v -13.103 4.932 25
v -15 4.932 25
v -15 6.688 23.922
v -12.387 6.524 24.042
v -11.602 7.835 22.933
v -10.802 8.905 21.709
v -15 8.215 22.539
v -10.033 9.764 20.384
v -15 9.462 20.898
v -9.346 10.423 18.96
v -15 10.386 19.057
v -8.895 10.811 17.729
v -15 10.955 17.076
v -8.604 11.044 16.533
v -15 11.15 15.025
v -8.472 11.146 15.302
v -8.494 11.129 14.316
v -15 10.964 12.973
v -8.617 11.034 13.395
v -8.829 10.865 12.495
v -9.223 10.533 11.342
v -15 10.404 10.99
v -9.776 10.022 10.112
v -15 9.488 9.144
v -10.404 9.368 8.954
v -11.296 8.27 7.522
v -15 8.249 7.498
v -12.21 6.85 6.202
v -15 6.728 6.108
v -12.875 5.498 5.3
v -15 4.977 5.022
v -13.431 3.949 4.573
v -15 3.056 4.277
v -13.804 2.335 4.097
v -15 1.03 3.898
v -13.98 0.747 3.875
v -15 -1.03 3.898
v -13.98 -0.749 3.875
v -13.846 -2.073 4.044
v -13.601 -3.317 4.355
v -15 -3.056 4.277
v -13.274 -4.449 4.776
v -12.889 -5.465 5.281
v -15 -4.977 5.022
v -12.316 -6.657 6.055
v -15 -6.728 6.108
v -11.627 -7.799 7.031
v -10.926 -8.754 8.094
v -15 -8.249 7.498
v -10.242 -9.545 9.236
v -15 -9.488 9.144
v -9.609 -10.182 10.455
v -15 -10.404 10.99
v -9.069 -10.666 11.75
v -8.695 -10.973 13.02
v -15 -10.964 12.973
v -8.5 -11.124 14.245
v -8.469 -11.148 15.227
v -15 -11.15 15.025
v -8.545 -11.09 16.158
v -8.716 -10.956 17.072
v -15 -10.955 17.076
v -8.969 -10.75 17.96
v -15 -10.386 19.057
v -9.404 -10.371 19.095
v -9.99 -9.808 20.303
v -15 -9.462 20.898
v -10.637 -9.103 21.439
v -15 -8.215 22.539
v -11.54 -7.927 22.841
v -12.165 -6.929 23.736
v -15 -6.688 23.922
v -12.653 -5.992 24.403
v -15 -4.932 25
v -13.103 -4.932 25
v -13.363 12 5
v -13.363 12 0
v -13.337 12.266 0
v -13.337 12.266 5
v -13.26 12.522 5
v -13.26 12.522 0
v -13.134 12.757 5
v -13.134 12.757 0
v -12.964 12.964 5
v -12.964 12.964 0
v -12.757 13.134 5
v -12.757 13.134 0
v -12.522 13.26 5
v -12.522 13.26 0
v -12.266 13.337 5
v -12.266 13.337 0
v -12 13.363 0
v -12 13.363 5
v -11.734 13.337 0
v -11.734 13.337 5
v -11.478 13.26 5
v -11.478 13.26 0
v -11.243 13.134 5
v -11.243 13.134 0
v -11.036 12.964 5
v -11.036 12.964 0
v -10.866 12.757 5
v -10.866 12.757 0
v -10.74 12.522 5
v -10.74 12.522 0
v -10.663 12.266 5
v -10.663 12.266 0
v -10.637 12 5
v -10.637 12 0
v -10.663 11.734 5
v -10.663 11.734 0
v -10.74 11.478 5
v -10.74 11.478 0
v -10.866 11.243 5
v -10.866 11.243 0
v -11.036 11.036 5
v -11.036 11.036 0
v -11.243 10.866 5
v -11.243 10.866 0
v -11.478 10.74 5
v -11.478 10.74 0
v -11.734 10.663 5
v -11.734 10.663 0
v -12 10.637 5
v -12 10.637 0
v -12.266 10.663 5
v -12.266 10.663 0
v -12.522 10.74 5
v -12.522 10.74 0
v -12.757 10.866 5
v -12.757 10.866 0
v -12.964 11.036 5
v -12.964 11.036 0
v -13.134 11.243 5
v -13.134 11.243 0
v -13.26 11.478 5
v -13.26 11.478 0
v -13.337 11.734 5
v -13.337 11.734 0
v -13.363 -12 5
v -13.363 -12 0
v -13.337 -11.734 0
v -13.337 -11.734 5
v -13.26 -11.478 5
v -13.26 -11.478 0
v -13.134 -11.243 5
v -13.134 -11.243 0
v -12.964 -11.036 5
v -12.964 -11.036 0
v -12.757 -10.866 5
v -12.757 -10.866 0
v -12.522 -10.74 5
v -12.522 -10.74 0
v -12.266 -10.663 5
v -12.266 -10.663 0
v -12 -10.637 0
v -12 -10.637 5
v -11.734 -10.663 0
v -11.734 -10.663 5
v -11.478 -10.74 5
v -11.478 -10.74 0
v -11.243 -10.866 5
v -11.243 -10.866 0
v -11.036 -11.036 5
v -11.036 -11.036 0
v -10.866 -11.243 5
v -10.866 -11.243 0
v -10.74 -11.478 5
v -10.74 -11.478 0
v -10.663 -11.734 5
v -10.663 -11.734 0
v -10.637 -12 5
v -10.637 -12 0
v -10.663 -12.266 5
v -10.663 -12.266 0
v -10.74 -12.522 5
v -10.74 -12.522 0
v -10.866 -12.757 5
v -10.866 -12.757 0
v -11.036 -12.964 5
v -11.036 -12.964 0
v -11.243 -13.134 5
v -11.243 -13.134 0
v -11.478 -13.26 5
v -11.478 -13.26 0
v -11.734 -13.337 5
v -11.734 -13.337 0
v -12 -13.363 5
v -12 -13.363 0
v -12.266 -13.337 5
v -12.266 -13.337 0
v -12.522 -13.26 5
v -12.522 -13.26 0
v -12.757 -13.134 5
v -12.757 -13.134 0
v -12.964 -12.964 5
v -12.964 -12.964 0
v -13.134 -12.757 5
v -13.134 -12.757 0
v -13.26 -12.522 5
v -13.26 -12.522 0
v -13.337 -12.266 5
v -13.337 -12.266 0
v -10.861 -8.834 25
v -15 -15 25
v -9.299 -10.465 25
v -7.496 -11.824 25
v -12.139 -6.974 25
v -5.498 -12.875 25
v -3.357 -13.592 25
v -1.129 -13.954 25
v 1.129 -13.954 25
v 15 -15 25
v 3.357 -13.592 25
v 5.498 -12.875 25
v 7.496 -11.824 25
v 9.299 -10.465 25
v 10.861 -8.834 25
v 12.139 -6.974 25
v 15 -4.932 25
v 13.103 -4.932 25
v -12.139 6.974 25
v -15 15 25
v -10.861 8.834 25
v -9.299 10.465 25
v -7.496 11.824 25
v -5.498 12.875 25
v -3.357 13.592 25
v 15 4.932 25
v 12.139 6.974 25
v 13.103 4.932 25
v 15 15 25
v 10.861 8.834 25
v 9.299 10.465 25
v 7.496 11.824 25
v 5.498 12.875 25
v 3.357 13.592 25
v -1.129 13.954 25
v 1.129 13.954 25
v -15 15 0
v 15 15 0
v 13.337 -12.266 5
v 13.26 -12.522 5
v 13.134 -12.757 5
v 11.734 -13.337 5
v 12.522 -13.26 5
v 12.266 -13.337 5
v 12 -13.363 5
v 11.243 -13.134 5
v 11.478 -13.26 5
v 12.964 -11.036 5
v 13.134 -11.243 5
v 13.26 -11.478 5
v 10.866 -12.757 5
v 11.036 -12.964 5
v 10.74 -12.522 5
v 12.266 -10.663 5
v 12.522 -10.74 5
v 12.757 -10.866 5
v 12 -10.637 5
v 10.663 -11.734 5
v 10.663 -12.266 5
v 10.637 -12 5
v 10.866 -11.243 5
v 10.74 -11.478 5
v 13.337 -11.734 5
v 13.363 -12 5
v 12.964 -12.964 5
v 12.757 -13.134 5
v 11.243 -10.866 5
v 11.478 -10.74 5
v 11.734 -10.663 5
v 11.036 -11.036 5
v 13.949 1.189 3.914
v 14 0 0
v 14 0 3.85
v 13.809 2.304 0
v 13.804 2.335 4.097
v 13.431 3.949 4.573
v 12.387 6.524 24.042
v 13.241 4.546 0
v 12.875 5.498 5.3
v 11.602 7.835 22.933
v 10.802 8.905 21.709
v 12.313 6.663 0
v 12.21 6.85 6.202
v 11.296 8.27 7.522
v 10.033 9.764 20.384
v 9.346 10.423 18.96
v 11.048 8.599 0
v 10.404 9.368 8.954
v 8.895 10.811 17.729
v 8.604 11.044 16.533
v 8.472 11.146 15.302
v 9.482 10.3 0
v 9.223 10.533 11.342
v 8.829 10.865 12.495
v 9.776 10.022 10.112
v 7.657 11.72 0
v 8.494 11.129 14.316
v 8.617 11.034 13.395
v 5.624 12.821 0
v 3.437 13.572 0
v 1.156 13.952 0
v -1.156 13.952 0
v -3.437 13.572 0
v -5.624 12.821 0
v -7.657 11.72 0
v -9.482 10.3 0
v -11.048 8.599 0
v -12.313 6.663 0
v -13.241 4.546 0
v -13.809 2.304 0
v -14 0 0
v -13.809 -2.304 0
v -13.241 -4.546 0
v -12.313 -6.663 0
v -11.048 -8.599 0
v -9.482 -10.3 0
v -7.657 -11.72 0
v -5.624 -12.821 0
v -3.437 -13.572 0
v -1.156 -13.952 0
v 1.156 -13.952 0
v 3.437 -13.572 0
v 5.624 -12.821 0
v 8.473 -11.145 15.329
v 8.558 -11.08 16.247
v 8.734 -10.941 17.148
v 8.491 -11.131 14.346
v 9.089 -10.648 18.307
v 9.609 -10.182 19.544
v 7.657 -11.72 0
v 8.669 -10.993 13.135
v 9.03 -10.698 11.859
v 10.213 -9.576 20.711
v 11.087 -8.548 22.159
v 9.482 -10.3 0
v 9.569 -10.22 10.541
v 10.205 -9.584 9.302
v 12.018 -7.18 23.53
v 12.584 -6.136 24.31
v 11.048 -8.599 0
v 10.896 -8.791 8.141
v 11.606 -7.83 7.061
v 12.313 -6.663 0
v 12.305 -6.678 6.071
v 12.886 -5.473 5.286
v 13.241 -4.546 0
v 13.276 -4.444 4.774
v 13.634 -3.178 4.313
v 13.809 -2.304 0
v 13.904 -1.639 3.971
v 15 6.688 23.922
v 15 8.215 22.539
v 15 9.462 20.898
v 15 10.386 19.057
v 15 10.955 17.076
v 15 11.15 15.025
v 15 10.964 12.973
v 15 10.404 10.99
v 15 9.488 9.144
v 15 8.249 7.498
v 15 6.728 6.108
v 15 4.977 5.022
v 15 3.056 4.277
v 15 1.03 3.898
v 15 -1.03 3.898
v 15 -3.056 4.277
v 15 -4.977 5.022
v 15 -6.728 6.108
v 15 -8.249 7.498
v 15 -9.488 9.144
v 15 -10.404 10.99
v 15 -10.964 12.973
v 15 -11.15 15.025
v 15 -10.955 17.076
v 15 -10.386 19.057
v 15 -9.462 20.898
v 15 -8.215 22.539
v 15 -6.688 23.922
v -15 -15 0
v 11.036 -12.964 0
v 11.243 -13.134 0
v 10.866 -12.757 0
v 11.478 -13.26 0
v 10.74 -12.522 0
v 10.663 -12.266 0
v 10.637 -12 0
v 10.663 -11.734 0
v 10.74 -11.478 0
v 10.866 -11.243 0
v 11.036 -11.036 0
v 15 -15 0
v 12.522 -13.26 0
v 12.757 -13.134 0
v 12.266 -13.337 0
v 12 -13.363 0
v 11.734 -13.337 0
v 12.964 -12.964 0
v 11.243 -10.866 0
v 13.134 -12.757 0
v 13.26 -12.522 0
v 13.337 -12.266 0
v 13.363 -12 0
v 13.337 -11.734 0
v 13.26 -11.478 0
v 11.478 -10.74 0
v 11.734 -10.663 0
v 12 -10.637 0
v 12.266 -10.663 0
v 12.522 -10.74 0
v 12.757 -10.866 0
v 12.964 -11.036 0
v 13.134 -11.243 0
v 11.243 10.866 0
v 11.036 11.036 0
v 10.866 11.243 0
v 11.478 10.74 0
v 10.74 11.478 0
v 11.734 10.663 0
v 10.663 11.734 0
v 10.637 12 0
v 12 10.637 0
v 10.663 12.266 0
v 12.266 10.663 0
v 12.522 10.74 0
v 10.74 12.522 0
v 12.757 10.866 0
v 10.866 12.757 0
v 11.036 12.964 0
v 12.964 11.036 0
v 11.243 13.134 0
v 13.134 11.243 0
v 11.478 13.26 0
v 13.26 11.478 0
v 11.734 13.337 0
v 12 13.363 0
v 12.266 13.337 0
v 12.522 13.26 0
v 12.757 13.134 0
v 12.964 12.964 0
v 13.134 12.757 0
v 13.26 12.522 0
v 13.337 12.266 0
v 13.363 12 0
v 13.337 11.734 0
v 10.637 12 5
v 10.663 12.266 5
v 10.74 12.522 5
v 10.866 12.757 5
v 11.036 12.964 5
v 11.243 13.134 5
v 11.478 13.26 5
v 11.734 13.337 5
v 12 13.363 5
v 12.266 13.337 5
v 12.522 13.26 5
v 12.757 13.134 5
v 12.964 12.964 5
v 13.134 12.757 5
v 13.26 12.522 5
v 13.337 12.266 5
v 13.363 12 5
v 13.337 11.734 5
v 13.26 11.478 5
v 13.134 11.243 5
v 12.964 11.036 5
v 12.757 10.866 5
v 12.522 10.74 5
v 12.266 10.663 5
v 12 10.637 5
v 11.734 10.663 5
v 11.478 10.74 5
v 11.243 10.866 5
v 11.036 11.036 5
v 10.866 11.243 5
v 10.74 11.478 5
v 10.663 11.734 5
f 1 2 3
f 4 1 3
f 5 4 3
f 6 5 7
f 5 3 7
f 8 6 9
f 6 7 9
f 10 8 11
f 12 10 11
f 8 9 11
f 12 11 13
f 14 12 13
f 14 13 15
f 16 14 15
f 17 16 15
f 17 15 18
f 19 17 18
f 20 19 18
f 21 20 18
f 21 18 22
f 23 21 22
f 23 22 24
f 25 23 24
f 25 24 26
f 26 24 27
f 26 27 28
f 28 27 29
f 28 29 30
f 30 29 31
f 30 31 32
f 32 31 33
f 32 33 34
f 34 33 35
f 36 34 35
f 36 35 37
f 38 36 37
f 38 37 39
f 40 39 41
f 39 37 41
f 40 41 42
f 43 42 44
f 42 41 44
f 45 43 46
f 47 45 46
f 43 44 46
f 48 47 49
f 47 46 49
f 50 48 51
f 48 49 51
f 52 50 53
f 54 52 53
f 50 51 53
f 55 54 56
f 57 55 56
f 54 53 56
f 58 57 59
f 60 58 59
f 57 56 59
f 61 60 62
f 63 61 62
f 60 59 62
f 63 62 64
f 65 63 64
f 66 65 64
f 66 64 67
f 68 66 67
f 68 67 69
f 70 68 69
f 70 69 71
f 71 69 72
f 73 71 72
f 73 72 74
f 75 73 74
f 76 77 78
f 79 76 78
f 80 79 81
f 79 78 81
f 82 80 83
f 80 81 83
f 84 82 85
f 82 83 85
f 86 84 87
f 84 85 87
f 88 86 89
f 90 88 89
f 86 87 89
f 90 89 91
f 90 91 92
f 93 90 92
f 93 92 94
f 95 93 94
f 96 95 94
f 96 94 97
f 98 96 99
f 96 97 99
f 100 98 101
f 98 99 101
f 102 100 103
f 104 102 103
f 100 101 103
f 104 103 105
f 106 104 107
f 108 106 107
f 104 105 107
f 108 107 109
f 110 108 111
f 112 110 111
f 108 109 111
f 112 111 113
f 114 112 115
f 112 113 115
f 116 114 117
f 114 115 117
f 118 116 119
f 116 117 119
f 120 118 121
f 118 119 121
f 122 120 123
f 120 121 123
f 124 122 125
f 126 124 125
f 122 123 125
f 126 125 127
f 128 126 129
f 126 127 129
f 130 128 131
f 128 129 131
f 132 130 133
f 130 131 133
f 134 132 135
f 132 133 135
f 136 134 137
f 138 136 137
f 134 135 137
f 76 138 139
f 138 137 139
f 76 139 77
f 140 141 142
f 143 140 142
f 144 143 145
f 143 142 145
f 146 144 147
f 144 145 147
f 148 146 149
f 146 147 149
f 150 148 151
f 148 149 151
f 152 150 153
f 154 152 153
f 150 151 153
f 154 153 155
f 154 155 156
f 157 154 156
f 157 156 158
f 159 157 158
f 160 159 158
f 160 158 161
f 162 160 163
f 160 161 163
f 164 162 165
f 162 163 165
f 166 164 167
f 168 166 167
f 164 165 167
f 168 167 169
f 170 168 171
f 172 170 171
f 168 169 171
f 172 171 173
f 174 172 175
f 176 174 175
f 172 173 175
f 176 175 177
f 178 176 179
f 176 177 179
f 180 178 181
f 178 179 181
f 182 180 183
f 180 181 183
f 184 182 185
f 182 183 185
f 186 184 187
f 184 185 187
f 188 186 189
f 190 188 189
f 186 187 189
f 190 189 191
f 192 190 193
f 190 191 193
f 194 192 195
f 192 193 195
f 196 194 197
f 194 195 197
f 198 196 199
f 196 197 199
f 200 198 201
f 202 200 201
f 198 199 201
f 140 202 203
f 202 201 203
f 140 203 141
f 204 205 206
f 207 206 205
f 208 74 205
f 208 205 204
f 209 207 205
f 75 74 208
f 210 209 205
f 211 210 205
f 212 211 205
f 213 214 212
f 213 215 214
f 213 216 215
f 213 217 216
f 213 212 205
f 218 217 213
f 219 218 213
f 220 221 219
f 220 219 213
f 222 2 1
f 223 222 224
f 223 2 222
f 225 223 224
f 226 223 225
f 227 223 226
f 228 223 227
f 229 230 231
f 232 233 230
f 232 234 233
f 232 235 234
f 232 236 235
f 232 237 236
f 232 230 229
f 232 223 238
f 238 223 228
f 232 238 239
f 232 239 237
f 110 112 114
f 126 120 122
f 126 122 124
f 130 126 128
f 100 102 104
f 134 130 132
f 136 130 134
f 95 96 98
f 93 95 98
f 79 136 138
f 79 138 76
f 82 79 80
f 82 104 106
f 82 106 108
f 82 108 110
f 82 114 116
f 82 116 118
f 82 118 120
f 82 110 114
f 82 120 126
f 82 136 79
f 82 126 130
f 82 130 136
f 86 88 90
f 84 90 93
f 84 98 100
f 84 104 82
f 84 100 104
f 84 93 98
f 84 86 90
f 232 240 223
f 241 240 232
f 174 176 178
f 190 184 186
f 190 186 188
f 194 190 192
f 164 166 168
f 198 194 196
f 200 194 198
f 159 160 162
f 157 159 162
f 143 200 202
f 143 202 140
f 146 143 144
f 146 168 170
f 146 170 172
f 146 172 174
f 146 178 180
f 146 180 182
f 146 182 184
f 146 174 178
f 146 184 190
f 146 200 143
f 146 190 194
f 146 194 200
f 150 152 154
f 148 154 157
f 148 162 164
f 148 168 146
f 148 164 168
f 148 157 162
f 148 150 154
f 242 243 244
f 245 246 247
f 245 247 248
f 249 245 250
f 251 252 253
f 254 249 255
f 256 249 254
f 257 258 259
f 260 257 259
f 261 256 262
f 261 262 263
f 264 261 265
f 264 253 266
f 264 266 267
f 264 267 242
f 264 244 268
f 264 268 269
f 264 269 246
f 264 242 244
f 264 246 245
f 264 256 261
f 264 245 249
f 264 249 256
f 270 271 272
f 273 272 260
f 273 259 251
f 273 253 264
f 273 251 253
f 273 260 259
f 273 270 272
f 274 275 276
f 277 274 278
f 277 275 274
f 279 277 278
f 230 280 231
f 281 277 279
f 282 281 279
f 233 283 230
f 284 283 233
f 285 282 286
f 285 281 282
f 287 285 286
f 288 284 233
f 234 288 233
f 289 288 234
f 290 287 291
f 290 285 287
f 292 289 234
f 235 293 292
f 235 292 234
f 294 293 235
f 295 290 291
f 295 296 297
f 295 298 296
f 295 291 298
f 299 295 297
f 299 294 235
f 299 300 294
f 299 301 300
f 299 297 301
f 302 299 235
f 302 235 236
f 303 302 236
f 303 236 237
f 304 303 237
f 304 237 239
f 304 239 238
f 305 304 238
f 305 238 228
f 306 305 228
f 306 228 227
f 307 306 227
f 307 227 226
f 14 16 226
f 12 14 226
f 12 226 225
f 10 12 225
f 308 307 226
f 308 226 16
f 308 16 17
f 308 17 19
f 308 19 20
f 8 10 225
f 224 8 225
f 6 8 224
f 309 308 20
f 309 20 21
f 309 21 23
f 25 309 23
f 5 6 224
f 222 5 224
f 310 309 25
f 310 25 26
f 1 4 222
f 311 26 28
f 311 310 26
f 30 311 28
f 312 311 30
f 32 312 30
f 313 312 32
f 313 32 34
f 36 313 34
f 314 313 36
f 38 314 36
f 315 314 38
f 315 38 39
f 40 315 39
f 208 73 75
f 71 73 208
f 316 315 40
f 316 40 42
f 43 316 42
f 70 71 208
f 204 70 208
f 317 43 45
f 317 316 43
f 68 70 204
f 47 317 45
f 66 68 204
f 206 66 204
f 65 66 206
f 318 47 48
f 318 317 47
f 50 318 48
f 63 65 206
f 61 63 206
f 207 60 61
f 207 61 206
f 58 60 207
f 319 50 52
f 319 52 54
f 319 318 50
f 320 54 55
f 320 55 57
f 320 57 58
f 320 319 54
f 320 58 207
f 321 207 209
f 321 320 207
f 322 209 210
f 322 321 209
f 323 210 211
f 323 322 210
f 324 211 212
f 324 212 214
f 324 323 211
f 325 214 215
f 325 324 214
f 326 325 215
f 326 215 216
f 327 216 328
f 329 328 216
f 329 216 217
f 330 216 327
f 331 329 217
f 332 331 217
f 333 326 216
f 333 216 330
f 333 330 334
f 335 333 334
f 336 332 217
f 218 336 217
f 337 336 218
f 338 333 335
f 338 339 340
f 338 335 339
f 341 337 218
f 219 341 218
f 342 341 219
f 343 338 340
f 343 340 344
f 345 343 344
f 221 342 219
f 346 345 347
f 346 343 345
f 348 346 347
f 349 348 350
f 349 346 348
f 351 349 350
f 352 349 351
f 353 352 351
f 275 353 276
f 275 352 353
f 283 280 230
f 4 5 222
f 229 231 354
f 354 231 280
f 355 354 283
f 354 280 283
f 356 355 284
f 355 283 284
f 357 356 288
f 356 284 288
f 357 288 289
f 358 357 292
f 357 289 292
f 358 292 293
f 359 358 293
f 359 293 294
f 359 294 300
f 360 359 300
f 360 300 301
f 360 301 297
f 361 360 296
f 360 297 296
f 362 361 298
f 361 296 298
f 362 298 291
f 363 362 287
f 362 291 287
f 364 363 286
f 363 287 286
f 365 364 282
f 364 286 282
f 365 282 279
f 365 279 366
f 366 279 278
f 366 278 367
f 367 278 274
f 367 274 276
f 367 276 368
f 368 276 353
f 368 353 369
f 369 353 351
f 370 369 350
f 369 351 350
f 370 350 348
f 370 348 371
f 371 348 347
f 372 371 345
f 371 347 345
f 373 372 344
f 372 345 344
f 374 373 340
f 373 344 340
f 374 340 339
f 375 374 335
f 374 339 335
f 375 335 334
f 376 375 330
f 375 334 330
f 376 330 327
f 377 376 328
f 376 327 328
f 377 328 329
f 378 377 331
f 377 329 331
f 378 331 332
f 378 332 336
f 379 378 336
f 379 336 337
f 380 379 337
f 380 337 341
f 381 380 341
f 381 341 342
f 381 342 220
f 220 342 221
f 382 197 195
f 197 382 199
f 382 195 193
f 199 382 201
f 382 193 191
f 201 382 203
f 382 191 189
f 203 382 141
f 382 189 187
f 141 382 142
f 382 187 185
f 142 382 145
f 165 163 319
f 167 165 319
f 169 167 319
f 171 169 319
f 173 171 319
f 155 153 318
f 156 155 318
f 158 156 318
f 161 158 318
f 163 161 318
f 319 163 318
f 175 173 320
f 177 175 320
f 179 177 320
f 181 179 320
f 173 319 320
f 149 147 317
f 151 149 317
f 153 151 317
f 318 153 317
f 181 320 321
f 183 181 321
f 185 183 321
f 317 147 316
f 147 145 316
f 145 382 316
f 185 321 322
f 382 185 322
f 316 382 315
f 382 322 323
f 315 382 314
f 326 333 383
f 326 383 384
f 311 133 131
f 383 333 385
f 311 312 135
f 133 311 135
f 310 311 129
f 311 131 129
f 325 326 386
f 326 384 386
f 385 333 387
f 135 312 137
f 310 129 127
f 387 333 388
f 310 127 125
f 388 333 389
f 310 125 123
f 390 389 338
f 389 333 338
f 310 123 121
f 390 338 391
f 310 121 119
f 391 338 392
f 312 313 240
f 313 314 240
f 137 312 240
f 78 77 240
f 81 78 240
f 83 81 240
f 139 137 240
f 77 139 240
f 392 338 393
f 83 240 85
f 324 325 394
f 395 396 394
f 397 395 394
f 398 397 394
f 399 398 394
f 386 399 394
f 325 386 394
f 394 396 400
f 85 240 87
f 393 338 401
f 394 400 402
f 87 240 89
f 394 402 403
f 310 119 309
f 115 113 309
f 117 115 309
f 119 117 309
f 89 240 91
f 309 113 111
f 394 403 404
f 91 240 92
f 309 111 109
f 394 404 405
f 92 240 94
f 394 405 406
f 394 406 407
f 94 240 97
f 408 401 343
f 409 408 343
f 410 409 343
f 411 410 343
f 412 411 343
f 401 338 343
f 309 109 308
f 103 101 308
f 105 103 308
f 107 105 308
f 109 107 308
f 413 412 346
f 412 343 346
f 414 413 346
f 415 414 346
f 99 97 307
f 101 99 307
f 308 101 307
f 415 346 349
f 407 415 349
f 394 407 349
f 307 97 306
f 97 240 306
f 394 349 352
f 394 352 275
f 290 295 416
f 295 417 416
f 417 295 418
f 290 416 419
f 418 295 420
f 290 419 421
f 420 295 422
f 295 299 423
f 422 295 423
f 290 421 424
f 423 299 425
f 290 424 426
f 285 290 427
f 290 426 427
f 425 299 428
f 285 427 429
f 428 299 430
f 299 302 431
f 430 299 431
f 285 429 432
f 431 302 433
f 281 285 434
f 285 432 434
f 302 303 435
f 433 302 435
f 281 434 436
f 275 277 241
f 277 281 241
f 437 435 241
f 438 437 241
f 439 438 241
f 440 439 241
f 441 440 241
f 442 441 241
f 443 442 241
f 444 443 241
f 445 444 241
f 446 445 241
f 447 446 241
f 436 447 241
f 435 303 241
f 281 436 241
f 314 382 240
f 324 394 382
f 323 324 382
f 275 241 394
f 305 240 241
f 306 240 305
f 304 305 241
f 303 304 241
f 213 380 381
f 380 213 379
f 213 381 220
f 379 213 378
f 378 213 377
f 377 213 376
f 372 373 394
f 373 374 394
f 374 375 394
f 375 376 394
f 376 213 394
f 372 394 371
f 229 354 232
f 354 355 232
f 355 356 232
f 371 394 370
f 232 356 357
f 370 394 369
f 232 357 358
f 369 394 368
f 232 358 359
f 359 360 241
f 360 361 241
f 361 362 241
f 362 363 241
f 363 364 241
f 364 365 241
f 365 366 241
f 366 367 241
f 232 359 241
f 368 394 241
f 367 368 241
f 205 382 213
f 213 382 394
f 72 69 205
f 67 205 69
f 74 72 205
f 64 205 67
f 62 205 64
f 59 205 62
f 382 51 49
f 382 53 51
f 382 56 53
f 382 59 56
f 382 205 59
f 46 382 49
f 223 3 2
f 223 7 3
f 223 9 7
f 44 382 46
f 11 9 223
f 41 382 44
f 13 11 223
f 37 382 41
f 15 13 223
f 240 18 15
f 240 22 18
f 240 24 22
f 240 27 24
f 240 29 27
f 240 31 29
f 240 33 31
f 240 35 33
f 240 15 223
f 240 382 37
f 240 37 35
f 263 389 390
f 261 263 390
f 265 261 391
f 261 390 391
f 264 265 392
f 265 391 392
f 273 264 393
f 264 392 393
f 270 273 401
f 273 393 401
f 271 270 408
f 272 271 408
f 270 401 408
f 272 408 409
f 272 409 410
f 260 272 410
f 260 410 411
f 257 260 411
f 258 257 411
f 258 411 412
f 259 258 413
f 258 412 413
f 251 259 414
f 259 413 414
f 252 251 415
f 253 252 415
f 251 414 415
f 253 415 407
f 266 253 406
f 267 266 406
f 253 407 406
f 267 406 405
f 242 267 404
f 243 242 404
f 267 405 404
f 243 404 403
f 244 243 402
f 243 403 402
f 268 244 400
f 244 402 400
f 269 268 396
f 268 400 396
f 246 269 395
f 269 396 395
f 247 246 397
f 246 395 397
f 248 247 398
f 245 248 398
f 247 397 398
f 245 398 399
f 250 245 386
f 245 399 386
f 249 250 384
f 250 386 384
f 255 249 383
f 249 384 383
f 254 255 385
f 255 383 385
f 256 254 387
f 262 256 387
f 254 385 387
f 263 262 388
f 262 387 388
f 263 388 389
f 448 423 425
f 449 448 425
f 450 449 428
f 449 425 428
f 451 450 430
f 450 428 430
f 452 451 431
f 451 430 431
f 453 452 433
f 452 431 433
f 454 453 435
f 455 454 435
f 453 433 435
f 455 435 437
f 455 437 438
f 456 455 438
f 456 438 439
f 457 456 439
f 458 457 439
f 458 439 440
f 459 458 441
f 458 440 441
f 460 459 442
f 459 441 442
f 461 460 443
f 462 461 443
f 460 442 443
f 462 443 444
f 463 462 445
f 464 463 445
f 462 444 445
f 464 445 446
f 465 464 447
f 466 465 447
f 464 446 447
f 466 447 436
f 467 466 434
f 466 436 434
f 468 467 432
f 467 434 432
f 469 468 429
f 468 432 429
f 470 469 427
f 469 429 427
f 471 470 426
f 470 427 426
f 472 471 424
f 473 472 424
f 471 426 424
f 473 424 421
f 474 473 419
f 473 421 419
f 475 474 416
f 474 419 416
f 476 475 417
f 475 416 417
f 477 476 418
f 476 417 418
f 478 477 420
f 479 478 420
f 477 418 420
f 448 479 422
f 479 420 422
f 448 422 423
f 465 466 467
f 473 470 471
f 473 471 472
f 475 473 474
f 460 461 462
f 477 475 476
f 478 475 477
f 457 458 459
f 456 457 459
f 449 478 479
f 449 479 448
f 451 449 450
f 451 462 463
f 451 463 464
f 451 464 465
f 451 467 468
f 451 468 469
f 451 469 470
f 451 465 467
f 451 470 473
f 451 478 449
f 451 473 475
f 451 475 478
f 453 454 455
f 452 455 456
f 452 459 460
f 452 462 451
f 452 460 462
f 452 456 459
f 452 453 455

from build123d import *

# Parameters (mm, degrees)
SKETCH_1_W          = 30
SKETCH_1_H          = 30
SKETCH_1_R          = 14
EXTRUDE_1_DEPTH     = 25
SKETCH_2_R          = 11.15
CUT_EXTRUDE_1_DEPTH = 42.833001327
SKETCH_3_R          = 1.363368529
CUT_EXTRUDE_2_DEPTH = 5


with BuildPart() as part:
    # 草图1 → 凸台-拉伸1 (new body)
    with BuildSketch(Plane.XY):
        Rectangle(SKETCH_1_W, SKETCH_1_H)
        Circle(SKETCH_1_R, mode=Mode.SUBTRACT)
    extrude(amount=EXTRUDE_1_DEPTH)

    # 草图2 → 切除-拉伸1 (cut, through all)
    with BuildSketch(Plane.ZY.offset(15)):
        with Locations((15, 0)):
            Circle(SKETCH_2_R)
    extrude(amount=-CUT_EXTRUDE_1_DEPTH, mode=Mode.SUBTRACT)

    # 草图3 → 切除-拉伸2 (cut)
    with BuildSketch(Plane(origin=(0, 0, 0), x_dir=(-1, 0, 0), z_dir=(0, 0, -1))):
        with Locations((12, 12)):
            Circle(SKETCH_3_R)
        with Locations((12, -12)):
            Circle(SKETCH_3_R)
        with Locations((-12, -12)):
            Circle(SKETCH_3_R)
        with Locations((-12, 12)):
            Circle(SKETCH_3_R)
    extrude(amount=-CUT_EXTRUDE_2_DEPTH, mode=Mode.SUBTRACT)


solid = part.part
